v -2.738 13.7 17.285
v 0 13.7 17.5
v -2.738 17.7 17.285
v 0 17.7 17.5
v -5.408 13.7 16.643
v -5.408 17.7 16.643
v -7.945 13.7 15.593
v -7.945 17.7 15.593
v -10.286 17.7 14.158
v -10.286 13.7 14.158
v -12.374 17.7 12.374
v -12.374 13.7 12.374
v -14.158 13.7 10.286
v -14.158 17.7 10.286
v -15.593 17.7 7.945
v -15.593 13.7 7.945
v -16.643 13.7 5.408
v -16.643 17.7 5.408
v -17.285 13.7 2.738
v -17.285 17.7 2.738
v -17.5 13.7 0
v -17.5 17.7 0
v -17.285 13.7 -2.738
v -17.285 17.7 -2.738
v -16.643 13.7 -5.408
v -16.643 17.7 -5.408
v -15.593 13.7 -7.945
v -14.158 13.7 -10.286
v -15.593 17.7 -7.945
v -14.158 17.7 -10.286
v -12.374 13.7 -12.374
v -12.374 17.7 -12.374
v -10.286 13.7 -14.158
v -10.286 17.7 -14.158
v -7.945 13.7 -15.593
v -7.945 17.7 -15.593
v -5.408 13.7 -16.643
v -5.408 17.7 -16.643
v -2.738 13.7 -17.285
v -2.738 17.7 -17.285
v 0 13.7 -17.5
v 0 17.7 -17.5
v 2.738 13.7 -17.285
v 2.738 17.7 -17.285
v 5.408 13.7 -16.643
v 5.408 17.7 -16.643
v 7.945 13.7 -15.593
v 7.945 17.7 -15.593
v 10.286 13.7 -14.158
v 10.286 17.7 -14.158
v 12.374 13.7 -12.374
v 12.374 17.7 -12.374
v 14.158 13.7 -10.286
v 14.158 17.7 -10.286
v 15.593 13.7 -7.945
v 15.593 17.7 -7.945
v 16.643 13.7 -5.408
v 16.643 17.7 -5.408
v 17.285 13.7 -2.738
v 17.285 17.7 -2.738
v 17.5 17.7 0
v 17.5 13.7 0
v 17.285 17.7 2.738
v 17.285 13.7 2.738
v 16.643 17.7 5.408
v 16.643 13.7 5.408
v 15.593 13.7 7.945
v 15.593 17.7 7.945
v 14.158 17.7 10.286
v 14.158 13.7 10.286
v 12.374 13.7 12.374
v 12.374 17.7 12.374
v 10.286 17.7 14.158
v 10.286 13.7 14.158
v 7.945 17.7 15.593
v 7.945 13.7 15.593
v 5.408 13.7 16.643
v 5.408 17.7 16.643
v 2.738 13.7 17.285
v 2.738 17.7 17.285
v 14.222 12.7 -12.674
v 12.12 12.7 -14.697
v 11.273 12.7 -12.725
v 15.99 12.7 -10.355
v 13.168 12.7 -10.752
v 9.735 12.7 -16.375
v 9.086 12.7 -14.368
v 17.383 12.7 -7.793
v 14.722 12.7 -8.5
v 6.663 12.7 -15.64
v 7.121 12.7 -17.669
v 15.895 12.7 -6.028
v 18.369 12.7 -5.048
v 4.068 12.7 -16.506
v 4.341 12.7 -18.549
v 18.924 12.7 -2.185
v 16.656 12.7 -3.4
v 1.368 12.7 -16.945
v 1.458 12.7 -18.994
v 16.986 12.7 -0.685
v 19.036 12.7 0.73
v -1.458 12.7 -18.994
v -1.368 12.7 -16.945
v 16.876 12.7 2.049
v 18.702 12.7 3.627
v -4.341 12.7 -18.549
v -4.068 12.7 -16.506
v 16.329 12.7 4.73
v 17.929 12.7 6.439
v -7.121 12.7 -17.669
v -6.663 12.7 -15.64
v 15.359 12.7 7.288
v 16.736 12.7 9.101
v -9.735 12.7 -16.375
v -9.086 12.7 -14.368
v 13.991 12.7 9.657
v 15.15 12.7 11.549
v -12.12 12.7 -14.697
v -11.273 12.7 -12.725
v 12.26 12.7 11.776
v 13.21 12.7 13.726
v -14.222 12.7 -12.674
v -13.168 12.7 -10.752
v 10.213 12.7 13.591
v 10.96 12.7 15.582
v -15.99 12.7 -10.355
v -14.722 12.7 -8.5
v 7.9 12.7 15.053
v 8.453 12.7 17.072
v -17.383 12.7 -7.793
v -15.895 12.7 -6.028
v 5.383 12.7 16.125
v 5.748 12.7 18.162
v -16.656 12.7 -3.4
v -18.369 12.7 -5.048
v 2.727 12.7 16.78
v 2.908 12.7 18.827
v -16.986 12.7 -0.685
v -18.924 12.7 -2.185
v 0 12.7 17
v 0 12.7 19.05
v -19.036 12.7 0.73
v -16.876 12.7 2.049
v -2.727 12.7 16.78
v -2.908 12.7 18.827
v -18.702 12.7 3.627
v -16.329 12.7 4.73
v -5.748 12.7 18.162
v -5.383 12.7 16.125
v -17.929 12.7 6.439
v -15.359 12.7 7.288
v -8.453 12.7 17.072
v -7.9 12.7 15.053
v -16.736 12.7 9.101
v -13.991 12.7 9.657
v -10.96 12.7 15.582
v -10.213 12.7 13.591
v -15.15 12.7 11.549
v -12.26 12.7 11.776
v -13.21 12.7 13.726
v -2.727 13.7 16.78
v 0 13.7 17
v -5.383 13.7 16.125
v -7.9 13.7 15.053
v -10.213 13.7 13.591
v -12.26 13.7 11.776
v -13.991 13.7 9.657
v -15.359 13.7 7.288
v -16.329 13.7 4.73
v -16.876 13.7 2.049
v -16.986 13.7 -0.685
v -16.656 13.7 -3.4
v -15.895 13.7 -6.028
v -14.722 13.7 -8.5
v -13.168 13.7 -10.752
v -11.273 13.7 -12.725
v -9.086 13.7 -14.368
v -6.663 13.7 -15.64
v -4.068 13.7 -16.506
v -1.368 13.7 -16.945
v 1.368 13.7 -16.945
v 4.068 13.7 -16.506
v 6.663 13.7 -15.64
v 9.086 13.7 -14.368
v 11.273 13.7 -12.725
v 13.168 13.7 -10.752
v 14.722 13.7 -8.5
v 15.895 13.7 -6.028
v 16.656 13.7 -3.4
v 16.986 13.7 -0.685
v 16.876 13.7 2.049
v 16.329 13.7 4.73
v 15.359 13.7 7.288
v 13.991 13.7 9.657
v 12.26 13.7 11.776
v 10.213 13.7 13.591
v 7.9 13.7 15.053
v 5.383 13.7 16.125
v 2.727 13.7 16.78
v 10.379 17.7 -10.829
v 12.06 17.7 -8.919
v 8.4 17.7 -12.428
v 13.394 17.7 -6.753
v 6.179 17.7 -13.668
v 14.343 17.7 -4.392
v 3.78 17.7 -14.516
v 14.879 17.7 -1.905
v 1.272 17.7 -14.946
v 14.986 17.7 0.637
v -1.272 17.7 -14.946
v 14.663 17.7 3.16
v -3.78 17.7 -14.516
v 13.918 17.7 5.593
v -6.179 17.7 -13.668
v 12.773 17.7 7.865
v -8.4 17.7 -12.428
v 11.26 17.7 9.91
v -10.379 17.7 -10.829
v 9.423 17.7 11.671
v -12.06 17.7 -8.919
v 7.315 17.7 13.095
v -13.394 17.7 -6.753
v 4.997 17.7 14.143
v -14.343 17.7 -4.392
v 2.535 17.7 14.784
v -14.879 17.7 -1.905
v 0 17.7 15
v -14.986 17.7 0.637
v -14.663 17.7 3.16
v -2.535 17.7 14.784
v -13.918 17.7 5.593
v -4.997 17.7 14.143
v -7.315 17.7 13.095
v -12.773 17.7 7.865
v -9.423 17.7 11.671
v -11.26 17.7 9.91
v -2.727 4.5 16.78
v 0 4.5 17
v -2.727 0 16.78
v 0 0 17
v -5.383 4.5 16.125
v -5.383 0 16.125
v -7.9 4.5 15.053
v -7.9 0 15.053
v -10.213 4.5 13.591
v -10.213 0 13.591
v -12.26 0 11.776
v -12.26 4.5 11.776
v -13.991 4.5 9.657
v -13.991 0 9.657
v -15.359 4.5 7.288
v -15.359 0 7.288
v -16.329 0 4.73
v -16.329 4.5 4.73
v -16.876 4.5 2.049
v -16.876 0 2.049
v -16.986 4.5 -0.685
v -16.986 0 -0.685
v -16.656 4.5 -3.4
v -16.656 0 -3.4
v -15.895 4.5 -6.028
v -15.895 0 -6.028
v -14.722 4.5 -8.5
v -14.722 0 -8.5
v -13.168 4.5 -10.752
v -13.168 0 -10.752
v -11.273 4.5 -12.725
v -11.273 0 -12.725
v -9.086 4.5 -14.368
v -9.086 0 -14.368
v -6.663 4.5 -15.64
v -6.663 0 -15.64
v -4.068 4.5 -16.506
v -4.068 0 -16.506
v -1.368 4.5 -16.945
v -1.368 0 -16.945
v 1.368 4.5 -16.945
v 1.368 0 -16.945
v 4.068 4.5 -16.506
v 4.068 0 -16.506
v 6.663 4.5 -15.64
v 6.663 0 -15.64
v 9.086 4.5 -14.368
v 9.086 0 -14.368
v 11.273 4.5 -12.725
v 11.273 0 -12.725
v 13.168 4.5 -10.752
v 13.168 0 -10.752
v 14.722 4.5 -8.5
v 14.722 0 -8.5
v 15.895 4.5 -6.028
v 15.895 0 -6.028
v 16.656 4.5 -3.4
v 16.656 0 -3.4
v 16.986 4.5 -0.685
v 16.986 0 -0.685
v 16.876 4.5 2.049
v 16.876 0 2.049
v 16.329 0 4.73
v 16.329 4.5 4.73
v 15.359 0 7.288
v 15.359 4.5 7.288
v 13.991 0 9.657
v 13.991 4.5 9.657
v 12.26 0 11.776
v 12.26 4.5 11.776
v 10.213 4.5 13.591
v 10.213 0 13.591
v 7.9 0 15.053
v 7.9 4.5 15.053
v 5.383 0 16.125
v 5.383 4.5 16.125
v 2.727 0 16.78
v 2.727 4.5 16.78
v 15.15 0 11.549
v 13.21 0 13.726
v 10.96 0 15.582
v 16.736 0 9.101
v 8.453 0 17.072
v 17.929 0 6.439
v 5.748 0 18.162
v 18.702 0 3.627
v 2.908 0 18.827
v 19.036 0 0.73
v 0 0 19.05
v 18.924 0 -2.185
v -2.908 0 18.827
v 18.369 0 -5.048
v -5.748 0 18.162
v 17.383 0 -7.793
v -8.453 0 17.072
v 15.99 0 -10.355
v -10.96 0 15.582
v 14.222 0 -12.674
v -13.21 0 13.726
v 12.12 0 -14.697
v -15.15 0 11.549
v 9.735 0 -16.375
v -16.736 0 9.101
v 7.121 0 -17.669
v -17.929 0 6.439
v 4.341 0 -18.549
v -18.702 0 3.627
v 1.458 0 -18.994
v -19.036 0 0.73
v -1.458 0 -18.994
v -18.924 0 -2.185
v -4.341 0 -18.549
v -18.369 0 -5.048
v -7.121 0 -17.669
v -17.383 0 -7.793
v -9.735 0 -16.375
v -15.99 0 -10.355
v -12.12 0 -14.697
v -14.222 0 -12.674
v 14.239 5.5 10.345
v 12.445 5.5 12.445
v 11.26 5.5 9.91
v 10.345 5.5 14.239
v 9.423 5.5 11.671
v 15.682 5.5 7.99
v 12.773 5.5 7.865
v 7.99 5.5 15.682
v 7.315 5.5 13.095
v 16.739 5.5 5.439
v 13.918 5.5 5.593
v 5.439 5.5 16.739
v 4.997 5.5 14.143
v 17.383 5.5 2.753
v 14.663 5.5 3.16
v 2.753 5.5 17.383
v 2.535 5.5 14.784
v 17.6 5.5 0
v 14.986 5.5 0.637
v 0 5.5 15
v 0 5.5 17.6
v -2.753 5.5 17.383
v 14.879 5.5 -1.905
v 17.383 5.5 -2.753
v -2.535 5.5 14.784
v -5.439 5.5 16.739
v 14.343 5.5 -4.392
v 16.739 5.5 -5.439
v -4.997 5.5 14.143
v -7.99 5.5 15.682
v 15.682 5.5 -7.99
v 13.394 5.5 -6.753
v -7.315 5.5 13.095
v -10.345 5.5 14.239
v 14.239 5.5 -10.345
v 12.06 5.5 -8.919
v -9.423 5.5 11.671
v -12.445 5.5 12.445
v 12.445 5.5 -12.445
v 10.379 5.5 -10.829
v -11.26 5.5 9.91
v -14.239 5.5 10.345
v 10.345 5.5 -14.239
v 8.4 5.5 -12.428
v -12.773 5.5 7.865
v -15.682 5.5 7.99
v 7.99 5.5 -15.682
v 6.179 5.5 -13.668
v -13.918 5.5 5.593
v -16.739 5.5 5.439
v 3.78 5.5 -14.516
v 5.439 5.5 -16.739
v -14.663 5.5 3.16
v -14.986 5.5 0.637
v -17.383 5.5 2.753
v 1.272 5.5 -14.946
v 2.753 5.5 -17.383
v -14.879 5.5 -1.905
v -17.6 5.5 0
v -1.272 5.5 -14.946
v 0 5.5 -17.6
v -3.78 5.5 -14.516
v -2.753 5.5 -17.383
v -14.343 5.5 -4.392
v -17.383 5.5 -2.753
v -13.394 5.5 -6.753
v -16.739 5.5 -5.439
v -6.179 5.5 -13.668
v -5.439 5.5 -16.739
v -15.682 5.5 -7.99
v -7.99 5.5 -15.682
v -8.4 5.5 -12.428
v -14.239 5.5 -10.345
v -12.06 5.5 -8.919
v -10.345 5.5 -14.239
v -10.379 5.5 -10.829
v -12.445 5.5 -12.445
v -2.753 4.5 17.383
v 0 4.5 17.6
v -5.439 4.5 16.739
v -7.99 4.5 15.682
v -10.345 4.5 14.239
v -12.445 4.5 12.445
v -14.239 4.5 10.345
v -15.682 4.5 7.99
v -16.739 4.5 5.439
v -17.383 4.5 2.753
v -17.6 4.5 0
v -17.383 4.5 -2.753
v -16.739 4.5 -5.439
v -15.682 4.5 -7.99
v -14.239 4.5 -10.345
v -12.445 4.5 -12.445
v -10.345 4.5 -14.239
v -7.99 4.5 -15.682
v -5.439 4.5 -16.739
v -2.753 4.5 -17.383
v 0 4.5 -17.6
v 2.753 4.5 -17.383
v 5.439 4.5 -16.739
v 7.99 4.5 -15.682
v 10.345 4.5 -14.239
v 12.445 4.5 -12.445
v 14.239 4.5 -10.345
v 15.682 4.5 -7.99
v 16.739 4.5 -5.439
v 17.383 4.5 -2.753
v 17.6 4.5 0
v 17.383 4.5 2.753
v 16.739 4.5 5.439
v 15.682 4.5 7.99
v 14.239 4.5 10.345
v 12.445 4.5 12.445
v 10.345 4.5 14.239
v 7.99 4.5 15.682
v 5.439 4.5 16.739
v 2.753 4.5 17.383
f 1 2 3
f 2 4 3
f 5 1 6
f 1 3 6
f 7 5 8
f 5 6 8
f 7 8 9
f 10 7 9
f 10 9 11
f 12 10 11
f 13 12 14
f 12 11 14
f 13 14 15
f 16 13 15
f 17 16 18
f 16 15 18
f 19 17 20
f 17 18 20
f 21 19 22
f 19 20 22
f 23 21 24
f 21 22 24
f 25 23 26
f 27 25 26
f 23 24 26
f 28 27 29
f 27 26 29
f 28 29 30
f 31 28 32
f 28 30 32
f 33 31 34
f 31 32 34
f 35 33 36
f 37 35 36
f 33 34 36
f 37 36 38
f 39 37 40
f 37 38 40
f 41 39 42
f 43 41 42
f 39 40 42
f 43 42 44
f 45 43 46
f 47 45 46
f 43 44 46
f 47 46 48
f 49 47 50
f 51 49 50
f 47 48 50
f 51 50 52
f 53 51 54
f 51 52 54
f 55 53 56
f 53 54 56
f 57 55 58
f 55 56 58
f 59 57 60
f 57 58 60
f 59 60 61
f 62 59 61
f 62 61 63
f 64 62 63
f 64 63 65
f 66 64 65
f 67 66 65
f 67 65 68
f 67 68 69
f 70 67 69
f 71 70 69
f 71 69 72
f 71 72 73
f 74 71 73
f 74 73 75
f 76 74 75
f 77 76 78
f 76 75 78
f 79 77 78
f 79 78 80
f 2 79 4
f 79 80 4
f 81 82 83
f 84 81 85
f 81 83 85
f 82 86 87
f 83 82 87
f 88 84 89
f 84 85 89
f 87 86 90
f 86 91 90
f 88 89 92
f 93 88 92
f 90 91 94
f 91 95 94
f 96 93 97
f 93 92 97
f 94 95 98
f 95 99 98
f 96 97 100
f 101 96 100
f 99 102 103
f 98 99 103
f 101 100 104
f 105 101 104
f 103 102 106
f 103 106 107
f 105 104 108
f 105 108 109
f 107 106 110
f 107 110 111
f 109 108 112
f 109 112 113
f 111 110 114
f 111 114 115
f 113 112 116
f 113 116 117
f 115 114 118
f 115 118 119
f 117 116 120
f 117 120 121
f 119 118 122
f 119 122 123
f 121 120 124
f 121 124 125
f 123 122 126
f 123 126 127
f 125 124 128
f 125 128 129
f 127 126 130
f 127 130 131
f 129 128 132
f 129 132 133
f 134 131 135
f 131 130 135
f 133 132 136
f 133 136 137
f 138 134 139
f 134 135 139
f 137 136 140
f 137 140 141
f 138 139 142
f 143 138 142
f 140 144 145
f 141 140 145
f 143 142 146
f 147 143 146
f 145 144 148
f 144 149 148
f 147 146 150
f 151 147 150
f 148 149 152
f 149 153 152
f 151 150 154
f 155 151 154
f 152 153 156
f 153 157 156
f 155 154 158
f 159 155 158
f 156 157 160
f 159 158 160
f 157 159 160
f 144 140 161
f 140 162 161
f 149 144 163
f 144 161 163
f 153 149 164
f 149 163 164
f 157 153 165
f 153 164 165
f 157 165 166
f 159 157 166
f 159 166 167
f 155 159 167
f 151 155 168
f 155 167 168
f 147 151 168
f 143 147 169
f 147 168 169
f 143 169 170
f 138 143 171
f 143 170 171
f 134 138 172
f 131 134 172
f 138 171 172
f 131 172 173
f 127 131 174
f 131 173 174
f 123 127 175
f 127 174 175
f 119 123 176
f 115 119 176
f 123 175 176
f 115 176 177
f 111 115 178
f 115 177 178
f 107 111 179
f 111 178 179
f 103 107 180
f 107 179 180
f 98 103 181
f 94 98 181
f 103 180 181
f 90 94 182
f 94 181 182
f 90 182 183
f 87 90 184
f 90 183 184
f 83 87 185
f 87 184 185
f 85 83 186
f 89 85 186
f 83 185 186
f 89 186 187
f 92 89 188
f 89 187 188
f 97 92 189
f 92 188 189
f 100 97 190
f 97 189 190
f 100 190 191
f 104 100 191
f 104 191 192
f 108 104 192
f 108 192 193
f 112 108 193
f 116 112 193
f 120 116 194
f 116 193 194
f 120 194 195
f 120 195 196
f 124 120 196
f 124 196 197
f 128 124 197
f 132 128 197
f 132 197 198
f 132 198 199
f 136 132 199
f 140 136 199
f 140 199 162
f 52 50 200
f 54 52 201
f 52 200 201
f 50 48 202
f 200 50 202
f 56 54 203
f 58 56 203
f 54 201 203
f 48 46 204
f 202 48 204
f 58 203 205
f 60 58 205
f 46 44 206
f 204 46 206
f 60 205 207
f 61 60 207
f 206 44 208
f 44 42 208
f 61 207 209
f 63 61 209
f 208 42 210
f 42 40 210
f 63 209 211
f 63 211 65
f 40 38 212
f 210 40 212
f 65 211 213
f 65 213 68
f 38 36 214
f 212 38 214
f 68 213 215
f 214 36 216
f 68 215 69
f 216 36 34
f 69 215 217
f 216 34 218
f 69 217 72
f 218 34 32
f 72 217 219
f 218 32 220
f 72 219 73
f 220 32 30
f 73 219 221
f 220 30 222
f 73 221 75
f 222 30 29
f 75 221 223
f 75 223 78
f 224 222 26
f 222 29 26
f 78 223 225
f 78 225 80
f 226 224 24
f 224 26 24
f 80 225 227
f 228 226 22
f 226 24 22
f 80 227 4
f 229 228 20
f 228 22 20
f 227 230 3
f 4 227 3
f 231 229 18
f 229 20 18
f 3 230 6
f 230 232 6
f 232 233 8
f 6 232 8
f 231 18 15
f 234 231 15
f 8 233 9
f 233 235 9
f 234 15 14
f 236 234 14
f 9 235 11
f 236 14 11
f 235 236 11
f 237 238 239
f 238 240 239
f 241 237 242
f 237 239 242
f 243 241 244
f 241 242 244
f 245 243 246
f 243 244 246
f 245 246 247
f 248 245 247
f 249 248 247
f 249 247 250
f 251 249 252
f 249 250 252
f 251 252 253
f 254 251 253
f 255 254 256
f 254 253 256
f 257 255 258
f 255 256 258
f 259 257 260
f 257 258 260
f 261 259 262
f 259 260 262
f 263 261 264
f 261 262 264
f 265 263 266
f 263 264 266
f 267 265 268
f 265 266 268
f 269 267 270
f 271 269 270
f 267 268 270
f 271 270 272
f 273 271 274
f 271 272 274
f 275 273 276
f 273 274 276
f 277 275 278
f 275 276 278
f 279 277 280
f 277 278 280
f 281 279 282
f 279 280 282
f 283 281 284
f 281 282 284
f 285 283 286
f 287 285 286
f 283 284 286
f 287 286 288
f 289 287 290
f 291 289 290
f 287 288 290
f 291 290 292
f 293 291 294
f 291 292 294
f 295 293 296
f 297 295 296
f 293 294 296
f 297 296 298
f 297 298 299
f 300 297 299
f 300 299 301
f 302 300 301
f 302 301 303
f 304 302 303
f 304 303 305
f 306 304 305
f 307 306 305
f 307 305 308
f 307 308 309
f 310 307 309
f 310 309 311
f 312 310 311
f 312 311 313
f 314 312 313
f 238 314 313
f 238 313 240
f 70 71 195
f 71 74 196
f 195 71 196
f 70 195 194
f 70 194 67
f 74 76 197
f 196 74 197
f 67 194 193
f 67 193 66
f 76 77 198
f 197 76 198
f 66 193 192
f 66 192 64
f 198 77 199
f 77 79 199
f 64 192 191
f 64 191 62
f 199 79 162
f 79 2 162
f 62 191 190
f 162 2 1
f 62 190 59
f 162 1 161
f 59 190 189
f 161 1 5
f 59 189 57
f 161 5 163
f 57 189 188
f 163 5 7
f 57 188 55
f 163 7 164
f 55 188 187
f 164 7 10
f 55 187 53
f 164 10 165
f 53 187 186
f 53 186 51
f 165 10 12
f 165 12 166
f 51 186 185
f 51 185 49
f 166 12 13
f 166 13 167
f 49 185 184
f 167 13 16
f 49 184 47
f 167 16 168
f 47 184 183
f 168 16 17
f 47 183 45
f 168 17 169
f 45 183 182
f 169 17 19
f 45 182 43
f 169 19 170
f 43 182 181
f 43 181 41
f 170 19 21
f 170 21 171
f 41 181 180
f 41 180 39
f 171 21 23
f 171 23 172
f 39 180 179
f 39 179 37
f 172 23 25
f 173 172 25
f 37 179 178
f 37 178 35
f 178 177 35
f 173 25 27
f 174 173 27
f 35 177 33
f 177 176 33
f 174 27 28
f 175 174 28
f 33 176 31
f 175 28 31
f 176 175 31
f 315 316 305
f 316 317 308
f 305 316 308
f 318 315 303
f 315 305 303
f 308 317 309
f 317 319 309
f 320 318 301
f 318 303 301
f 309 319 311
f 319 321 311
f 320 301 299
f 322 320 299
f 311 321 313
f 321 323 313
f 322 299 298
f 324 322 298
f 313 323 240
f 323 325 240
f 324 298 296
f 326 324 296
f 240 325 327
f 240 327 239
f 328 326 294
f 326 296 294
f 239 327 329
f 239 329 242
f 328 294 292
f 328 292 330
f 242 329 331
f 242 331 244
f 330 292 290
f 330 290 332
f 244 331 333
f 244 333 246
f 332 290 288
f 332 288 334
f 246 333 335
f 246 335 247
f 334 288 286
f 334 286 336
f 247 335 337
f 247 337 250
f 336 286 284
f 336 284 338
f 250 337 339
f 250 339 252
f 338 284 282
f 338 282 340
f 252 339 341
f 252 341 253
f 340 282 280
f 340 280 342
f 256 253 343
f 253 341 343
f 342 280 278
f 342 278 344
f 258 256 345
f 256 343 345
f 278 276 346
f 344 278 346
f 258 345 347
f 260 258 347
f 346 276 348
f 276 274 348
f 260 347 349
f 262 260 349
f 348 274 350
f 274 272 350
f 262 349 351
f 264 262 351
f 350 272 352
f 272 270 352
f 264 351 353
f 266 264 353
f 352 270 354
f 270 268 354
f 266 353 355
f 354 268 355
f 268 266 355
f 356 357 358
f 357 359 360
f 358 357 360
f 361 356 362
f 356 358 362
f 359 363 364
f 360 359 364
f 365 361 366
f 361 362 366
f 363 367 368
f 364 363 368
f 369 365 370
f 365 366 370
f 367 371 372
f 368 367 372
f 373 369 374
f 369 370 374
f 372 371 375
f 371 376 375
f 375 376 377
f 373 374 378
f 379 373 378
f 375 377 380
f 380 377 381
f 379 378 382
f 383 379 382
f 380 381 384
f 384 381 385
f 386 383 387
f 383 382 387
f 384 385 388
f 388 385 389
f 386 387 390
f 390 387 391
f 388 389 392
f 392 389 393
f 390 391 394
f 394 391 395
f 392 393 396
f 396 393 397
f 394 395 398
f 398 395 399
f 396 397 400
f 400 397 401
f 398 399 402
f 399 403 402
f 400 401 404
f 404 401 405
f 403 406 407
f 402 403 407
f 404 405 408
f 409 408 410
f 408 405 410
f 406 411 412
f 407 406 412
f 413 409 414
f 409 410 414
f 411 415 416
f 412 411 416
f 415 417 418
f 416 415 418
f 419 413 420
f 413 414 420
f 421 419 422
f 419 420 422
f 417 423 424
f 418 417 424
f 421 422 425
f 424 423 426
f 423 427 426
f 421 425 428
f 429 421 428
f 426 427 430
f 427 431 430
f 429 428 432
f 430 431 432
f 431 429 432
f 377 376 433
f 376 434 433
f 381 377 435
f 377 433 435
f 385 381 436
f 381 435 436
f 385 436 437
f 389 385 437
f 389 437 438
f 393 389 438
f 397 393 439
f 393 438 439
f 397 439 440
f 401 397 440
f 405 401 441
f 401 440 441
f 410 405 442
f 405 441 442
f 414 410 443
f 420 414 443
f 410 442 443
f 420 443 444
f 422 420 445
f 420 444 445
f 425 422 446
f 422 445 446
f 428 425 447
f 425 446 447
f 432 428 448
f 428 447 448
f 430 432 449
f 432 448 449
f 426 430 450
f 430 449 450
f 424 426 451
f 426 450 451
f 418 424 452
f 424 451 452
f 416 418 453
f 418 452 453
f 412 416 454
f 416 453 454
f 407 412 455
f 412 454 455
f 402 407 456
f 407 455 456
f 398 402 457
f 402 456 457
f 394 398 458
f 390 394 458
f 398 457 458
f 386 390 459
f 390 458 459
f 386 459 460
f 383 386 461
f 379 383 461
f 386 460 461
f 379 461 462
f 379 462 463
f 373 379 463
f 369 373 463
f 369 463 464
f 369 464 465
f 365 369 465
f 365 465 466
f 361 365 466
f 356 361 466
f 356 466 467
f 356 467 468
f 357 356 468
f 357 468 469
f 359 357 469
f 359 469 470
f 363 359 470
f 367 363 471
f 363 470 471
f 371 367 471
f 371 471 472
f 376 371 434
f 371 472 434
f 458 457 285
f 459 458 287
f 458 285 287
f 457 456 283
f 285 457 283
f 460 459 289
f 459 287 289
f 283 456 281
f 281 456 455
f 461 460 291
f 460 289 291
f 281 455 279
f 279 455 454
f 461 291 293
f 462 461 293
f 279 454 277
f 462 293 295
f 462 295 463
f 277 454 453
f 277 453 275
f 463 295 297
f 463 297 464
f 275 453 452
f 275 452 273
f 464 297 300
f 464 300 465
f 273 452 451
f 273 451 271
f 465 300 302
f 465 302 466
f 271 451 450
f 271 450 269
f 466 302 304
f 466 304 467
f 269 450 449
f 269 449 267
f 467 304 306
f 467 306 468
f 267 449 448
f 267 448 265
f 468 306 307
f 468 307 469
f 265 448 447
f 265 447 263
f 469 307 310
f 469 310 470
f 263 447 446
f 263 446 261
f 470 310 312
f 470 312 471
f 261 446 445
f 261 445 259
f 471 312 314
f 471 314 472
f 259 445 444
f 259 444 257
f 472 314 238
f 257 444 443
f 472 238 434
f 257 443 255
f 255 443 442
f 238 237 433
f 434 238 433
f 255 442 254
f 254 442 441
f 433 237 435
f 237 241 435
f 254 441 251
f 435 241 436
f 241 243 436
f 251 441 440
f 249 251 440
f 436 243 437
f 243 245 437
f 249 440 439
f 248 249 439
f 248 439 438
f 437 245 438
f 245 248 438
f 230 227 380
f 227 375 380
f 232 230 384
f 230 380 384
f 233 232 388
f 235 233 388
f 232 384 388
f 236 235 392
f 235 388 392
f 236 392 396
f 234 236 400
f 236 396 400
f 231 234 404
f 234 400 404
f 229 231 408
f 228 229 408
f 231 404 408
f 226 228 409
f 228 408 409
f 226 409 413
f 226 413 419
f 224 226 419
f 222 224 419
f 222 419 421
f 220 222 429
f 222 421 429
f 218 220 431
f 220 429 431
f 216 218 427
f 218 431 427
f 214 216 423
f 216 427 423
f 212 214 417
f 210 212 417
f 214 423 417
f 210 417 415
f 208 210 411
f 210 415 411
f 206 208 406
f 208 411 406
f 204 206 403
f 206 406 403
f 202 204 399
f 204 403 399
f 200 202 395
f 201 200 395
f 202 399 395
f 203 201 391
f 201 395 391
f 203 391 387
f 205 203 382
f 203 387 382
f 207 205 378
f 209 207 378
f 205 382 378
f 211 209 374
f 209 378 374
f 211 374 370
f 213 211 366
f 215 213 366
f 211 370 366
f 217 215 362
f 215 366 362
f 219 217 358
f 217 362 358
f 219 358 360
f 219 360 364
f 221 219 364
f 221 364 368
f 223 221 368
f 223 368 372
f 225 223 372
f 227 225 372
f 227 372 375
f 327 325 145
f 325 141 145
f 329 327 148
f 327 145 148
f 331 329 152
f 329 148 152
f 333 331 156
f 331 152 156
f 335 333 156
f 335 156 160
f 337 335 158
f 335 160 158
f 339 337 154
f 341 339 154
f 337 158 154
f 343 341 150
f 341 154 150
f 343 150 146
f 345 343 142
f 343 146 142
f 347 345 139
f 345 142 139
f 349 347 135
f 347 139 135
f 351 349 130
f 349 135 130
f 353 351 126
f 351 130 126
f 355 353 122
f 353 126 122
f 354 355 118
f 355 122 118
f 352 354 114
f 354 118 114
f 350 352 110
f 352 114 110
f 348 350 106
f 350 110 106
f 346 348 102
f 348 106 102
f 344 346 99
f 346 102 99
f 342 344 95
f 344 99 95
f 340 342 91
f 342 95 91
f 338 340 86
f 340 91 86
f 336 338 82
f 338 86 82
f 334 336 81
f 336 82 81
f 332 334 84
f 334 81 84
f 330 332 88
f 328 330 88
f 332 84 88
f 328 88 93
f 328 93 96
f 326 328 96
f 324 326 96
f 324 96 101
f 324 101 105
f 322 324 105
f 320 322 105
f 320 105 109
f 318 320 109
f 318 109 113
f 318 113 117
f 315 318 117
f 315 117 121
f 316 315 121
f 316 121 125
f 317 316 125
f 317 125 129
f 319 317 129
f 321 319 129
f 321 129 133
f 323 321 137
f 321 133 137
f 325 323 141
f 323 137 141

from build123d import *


with BuildPart() as part:
    # 草图1 → 旋转1 (revolve)
    with BuildSketch(Plane.XY, mode=Mode.PRIVATE) as revolve_1_sk:
        Polygon((19.05, 0), (19.05, 12.7), (17, 12.7), (17, 13.7), (17.5, 13.7), (17.5, 17.7), (15, 17.7), (15, 5.5), (17.6, 5.5), (17.6, 4.5), (17, 4.5), (17, 0), align=None)
    revolve(revolve_1_sk.sketch.rotate(Axis((0, 161.376166943, 0), (0, -1, 0)), 90), axis=Axis((0, 161.376166943, 0), (0, -1, 0)))  # turned: the seam where the file's is


solid = part.part
